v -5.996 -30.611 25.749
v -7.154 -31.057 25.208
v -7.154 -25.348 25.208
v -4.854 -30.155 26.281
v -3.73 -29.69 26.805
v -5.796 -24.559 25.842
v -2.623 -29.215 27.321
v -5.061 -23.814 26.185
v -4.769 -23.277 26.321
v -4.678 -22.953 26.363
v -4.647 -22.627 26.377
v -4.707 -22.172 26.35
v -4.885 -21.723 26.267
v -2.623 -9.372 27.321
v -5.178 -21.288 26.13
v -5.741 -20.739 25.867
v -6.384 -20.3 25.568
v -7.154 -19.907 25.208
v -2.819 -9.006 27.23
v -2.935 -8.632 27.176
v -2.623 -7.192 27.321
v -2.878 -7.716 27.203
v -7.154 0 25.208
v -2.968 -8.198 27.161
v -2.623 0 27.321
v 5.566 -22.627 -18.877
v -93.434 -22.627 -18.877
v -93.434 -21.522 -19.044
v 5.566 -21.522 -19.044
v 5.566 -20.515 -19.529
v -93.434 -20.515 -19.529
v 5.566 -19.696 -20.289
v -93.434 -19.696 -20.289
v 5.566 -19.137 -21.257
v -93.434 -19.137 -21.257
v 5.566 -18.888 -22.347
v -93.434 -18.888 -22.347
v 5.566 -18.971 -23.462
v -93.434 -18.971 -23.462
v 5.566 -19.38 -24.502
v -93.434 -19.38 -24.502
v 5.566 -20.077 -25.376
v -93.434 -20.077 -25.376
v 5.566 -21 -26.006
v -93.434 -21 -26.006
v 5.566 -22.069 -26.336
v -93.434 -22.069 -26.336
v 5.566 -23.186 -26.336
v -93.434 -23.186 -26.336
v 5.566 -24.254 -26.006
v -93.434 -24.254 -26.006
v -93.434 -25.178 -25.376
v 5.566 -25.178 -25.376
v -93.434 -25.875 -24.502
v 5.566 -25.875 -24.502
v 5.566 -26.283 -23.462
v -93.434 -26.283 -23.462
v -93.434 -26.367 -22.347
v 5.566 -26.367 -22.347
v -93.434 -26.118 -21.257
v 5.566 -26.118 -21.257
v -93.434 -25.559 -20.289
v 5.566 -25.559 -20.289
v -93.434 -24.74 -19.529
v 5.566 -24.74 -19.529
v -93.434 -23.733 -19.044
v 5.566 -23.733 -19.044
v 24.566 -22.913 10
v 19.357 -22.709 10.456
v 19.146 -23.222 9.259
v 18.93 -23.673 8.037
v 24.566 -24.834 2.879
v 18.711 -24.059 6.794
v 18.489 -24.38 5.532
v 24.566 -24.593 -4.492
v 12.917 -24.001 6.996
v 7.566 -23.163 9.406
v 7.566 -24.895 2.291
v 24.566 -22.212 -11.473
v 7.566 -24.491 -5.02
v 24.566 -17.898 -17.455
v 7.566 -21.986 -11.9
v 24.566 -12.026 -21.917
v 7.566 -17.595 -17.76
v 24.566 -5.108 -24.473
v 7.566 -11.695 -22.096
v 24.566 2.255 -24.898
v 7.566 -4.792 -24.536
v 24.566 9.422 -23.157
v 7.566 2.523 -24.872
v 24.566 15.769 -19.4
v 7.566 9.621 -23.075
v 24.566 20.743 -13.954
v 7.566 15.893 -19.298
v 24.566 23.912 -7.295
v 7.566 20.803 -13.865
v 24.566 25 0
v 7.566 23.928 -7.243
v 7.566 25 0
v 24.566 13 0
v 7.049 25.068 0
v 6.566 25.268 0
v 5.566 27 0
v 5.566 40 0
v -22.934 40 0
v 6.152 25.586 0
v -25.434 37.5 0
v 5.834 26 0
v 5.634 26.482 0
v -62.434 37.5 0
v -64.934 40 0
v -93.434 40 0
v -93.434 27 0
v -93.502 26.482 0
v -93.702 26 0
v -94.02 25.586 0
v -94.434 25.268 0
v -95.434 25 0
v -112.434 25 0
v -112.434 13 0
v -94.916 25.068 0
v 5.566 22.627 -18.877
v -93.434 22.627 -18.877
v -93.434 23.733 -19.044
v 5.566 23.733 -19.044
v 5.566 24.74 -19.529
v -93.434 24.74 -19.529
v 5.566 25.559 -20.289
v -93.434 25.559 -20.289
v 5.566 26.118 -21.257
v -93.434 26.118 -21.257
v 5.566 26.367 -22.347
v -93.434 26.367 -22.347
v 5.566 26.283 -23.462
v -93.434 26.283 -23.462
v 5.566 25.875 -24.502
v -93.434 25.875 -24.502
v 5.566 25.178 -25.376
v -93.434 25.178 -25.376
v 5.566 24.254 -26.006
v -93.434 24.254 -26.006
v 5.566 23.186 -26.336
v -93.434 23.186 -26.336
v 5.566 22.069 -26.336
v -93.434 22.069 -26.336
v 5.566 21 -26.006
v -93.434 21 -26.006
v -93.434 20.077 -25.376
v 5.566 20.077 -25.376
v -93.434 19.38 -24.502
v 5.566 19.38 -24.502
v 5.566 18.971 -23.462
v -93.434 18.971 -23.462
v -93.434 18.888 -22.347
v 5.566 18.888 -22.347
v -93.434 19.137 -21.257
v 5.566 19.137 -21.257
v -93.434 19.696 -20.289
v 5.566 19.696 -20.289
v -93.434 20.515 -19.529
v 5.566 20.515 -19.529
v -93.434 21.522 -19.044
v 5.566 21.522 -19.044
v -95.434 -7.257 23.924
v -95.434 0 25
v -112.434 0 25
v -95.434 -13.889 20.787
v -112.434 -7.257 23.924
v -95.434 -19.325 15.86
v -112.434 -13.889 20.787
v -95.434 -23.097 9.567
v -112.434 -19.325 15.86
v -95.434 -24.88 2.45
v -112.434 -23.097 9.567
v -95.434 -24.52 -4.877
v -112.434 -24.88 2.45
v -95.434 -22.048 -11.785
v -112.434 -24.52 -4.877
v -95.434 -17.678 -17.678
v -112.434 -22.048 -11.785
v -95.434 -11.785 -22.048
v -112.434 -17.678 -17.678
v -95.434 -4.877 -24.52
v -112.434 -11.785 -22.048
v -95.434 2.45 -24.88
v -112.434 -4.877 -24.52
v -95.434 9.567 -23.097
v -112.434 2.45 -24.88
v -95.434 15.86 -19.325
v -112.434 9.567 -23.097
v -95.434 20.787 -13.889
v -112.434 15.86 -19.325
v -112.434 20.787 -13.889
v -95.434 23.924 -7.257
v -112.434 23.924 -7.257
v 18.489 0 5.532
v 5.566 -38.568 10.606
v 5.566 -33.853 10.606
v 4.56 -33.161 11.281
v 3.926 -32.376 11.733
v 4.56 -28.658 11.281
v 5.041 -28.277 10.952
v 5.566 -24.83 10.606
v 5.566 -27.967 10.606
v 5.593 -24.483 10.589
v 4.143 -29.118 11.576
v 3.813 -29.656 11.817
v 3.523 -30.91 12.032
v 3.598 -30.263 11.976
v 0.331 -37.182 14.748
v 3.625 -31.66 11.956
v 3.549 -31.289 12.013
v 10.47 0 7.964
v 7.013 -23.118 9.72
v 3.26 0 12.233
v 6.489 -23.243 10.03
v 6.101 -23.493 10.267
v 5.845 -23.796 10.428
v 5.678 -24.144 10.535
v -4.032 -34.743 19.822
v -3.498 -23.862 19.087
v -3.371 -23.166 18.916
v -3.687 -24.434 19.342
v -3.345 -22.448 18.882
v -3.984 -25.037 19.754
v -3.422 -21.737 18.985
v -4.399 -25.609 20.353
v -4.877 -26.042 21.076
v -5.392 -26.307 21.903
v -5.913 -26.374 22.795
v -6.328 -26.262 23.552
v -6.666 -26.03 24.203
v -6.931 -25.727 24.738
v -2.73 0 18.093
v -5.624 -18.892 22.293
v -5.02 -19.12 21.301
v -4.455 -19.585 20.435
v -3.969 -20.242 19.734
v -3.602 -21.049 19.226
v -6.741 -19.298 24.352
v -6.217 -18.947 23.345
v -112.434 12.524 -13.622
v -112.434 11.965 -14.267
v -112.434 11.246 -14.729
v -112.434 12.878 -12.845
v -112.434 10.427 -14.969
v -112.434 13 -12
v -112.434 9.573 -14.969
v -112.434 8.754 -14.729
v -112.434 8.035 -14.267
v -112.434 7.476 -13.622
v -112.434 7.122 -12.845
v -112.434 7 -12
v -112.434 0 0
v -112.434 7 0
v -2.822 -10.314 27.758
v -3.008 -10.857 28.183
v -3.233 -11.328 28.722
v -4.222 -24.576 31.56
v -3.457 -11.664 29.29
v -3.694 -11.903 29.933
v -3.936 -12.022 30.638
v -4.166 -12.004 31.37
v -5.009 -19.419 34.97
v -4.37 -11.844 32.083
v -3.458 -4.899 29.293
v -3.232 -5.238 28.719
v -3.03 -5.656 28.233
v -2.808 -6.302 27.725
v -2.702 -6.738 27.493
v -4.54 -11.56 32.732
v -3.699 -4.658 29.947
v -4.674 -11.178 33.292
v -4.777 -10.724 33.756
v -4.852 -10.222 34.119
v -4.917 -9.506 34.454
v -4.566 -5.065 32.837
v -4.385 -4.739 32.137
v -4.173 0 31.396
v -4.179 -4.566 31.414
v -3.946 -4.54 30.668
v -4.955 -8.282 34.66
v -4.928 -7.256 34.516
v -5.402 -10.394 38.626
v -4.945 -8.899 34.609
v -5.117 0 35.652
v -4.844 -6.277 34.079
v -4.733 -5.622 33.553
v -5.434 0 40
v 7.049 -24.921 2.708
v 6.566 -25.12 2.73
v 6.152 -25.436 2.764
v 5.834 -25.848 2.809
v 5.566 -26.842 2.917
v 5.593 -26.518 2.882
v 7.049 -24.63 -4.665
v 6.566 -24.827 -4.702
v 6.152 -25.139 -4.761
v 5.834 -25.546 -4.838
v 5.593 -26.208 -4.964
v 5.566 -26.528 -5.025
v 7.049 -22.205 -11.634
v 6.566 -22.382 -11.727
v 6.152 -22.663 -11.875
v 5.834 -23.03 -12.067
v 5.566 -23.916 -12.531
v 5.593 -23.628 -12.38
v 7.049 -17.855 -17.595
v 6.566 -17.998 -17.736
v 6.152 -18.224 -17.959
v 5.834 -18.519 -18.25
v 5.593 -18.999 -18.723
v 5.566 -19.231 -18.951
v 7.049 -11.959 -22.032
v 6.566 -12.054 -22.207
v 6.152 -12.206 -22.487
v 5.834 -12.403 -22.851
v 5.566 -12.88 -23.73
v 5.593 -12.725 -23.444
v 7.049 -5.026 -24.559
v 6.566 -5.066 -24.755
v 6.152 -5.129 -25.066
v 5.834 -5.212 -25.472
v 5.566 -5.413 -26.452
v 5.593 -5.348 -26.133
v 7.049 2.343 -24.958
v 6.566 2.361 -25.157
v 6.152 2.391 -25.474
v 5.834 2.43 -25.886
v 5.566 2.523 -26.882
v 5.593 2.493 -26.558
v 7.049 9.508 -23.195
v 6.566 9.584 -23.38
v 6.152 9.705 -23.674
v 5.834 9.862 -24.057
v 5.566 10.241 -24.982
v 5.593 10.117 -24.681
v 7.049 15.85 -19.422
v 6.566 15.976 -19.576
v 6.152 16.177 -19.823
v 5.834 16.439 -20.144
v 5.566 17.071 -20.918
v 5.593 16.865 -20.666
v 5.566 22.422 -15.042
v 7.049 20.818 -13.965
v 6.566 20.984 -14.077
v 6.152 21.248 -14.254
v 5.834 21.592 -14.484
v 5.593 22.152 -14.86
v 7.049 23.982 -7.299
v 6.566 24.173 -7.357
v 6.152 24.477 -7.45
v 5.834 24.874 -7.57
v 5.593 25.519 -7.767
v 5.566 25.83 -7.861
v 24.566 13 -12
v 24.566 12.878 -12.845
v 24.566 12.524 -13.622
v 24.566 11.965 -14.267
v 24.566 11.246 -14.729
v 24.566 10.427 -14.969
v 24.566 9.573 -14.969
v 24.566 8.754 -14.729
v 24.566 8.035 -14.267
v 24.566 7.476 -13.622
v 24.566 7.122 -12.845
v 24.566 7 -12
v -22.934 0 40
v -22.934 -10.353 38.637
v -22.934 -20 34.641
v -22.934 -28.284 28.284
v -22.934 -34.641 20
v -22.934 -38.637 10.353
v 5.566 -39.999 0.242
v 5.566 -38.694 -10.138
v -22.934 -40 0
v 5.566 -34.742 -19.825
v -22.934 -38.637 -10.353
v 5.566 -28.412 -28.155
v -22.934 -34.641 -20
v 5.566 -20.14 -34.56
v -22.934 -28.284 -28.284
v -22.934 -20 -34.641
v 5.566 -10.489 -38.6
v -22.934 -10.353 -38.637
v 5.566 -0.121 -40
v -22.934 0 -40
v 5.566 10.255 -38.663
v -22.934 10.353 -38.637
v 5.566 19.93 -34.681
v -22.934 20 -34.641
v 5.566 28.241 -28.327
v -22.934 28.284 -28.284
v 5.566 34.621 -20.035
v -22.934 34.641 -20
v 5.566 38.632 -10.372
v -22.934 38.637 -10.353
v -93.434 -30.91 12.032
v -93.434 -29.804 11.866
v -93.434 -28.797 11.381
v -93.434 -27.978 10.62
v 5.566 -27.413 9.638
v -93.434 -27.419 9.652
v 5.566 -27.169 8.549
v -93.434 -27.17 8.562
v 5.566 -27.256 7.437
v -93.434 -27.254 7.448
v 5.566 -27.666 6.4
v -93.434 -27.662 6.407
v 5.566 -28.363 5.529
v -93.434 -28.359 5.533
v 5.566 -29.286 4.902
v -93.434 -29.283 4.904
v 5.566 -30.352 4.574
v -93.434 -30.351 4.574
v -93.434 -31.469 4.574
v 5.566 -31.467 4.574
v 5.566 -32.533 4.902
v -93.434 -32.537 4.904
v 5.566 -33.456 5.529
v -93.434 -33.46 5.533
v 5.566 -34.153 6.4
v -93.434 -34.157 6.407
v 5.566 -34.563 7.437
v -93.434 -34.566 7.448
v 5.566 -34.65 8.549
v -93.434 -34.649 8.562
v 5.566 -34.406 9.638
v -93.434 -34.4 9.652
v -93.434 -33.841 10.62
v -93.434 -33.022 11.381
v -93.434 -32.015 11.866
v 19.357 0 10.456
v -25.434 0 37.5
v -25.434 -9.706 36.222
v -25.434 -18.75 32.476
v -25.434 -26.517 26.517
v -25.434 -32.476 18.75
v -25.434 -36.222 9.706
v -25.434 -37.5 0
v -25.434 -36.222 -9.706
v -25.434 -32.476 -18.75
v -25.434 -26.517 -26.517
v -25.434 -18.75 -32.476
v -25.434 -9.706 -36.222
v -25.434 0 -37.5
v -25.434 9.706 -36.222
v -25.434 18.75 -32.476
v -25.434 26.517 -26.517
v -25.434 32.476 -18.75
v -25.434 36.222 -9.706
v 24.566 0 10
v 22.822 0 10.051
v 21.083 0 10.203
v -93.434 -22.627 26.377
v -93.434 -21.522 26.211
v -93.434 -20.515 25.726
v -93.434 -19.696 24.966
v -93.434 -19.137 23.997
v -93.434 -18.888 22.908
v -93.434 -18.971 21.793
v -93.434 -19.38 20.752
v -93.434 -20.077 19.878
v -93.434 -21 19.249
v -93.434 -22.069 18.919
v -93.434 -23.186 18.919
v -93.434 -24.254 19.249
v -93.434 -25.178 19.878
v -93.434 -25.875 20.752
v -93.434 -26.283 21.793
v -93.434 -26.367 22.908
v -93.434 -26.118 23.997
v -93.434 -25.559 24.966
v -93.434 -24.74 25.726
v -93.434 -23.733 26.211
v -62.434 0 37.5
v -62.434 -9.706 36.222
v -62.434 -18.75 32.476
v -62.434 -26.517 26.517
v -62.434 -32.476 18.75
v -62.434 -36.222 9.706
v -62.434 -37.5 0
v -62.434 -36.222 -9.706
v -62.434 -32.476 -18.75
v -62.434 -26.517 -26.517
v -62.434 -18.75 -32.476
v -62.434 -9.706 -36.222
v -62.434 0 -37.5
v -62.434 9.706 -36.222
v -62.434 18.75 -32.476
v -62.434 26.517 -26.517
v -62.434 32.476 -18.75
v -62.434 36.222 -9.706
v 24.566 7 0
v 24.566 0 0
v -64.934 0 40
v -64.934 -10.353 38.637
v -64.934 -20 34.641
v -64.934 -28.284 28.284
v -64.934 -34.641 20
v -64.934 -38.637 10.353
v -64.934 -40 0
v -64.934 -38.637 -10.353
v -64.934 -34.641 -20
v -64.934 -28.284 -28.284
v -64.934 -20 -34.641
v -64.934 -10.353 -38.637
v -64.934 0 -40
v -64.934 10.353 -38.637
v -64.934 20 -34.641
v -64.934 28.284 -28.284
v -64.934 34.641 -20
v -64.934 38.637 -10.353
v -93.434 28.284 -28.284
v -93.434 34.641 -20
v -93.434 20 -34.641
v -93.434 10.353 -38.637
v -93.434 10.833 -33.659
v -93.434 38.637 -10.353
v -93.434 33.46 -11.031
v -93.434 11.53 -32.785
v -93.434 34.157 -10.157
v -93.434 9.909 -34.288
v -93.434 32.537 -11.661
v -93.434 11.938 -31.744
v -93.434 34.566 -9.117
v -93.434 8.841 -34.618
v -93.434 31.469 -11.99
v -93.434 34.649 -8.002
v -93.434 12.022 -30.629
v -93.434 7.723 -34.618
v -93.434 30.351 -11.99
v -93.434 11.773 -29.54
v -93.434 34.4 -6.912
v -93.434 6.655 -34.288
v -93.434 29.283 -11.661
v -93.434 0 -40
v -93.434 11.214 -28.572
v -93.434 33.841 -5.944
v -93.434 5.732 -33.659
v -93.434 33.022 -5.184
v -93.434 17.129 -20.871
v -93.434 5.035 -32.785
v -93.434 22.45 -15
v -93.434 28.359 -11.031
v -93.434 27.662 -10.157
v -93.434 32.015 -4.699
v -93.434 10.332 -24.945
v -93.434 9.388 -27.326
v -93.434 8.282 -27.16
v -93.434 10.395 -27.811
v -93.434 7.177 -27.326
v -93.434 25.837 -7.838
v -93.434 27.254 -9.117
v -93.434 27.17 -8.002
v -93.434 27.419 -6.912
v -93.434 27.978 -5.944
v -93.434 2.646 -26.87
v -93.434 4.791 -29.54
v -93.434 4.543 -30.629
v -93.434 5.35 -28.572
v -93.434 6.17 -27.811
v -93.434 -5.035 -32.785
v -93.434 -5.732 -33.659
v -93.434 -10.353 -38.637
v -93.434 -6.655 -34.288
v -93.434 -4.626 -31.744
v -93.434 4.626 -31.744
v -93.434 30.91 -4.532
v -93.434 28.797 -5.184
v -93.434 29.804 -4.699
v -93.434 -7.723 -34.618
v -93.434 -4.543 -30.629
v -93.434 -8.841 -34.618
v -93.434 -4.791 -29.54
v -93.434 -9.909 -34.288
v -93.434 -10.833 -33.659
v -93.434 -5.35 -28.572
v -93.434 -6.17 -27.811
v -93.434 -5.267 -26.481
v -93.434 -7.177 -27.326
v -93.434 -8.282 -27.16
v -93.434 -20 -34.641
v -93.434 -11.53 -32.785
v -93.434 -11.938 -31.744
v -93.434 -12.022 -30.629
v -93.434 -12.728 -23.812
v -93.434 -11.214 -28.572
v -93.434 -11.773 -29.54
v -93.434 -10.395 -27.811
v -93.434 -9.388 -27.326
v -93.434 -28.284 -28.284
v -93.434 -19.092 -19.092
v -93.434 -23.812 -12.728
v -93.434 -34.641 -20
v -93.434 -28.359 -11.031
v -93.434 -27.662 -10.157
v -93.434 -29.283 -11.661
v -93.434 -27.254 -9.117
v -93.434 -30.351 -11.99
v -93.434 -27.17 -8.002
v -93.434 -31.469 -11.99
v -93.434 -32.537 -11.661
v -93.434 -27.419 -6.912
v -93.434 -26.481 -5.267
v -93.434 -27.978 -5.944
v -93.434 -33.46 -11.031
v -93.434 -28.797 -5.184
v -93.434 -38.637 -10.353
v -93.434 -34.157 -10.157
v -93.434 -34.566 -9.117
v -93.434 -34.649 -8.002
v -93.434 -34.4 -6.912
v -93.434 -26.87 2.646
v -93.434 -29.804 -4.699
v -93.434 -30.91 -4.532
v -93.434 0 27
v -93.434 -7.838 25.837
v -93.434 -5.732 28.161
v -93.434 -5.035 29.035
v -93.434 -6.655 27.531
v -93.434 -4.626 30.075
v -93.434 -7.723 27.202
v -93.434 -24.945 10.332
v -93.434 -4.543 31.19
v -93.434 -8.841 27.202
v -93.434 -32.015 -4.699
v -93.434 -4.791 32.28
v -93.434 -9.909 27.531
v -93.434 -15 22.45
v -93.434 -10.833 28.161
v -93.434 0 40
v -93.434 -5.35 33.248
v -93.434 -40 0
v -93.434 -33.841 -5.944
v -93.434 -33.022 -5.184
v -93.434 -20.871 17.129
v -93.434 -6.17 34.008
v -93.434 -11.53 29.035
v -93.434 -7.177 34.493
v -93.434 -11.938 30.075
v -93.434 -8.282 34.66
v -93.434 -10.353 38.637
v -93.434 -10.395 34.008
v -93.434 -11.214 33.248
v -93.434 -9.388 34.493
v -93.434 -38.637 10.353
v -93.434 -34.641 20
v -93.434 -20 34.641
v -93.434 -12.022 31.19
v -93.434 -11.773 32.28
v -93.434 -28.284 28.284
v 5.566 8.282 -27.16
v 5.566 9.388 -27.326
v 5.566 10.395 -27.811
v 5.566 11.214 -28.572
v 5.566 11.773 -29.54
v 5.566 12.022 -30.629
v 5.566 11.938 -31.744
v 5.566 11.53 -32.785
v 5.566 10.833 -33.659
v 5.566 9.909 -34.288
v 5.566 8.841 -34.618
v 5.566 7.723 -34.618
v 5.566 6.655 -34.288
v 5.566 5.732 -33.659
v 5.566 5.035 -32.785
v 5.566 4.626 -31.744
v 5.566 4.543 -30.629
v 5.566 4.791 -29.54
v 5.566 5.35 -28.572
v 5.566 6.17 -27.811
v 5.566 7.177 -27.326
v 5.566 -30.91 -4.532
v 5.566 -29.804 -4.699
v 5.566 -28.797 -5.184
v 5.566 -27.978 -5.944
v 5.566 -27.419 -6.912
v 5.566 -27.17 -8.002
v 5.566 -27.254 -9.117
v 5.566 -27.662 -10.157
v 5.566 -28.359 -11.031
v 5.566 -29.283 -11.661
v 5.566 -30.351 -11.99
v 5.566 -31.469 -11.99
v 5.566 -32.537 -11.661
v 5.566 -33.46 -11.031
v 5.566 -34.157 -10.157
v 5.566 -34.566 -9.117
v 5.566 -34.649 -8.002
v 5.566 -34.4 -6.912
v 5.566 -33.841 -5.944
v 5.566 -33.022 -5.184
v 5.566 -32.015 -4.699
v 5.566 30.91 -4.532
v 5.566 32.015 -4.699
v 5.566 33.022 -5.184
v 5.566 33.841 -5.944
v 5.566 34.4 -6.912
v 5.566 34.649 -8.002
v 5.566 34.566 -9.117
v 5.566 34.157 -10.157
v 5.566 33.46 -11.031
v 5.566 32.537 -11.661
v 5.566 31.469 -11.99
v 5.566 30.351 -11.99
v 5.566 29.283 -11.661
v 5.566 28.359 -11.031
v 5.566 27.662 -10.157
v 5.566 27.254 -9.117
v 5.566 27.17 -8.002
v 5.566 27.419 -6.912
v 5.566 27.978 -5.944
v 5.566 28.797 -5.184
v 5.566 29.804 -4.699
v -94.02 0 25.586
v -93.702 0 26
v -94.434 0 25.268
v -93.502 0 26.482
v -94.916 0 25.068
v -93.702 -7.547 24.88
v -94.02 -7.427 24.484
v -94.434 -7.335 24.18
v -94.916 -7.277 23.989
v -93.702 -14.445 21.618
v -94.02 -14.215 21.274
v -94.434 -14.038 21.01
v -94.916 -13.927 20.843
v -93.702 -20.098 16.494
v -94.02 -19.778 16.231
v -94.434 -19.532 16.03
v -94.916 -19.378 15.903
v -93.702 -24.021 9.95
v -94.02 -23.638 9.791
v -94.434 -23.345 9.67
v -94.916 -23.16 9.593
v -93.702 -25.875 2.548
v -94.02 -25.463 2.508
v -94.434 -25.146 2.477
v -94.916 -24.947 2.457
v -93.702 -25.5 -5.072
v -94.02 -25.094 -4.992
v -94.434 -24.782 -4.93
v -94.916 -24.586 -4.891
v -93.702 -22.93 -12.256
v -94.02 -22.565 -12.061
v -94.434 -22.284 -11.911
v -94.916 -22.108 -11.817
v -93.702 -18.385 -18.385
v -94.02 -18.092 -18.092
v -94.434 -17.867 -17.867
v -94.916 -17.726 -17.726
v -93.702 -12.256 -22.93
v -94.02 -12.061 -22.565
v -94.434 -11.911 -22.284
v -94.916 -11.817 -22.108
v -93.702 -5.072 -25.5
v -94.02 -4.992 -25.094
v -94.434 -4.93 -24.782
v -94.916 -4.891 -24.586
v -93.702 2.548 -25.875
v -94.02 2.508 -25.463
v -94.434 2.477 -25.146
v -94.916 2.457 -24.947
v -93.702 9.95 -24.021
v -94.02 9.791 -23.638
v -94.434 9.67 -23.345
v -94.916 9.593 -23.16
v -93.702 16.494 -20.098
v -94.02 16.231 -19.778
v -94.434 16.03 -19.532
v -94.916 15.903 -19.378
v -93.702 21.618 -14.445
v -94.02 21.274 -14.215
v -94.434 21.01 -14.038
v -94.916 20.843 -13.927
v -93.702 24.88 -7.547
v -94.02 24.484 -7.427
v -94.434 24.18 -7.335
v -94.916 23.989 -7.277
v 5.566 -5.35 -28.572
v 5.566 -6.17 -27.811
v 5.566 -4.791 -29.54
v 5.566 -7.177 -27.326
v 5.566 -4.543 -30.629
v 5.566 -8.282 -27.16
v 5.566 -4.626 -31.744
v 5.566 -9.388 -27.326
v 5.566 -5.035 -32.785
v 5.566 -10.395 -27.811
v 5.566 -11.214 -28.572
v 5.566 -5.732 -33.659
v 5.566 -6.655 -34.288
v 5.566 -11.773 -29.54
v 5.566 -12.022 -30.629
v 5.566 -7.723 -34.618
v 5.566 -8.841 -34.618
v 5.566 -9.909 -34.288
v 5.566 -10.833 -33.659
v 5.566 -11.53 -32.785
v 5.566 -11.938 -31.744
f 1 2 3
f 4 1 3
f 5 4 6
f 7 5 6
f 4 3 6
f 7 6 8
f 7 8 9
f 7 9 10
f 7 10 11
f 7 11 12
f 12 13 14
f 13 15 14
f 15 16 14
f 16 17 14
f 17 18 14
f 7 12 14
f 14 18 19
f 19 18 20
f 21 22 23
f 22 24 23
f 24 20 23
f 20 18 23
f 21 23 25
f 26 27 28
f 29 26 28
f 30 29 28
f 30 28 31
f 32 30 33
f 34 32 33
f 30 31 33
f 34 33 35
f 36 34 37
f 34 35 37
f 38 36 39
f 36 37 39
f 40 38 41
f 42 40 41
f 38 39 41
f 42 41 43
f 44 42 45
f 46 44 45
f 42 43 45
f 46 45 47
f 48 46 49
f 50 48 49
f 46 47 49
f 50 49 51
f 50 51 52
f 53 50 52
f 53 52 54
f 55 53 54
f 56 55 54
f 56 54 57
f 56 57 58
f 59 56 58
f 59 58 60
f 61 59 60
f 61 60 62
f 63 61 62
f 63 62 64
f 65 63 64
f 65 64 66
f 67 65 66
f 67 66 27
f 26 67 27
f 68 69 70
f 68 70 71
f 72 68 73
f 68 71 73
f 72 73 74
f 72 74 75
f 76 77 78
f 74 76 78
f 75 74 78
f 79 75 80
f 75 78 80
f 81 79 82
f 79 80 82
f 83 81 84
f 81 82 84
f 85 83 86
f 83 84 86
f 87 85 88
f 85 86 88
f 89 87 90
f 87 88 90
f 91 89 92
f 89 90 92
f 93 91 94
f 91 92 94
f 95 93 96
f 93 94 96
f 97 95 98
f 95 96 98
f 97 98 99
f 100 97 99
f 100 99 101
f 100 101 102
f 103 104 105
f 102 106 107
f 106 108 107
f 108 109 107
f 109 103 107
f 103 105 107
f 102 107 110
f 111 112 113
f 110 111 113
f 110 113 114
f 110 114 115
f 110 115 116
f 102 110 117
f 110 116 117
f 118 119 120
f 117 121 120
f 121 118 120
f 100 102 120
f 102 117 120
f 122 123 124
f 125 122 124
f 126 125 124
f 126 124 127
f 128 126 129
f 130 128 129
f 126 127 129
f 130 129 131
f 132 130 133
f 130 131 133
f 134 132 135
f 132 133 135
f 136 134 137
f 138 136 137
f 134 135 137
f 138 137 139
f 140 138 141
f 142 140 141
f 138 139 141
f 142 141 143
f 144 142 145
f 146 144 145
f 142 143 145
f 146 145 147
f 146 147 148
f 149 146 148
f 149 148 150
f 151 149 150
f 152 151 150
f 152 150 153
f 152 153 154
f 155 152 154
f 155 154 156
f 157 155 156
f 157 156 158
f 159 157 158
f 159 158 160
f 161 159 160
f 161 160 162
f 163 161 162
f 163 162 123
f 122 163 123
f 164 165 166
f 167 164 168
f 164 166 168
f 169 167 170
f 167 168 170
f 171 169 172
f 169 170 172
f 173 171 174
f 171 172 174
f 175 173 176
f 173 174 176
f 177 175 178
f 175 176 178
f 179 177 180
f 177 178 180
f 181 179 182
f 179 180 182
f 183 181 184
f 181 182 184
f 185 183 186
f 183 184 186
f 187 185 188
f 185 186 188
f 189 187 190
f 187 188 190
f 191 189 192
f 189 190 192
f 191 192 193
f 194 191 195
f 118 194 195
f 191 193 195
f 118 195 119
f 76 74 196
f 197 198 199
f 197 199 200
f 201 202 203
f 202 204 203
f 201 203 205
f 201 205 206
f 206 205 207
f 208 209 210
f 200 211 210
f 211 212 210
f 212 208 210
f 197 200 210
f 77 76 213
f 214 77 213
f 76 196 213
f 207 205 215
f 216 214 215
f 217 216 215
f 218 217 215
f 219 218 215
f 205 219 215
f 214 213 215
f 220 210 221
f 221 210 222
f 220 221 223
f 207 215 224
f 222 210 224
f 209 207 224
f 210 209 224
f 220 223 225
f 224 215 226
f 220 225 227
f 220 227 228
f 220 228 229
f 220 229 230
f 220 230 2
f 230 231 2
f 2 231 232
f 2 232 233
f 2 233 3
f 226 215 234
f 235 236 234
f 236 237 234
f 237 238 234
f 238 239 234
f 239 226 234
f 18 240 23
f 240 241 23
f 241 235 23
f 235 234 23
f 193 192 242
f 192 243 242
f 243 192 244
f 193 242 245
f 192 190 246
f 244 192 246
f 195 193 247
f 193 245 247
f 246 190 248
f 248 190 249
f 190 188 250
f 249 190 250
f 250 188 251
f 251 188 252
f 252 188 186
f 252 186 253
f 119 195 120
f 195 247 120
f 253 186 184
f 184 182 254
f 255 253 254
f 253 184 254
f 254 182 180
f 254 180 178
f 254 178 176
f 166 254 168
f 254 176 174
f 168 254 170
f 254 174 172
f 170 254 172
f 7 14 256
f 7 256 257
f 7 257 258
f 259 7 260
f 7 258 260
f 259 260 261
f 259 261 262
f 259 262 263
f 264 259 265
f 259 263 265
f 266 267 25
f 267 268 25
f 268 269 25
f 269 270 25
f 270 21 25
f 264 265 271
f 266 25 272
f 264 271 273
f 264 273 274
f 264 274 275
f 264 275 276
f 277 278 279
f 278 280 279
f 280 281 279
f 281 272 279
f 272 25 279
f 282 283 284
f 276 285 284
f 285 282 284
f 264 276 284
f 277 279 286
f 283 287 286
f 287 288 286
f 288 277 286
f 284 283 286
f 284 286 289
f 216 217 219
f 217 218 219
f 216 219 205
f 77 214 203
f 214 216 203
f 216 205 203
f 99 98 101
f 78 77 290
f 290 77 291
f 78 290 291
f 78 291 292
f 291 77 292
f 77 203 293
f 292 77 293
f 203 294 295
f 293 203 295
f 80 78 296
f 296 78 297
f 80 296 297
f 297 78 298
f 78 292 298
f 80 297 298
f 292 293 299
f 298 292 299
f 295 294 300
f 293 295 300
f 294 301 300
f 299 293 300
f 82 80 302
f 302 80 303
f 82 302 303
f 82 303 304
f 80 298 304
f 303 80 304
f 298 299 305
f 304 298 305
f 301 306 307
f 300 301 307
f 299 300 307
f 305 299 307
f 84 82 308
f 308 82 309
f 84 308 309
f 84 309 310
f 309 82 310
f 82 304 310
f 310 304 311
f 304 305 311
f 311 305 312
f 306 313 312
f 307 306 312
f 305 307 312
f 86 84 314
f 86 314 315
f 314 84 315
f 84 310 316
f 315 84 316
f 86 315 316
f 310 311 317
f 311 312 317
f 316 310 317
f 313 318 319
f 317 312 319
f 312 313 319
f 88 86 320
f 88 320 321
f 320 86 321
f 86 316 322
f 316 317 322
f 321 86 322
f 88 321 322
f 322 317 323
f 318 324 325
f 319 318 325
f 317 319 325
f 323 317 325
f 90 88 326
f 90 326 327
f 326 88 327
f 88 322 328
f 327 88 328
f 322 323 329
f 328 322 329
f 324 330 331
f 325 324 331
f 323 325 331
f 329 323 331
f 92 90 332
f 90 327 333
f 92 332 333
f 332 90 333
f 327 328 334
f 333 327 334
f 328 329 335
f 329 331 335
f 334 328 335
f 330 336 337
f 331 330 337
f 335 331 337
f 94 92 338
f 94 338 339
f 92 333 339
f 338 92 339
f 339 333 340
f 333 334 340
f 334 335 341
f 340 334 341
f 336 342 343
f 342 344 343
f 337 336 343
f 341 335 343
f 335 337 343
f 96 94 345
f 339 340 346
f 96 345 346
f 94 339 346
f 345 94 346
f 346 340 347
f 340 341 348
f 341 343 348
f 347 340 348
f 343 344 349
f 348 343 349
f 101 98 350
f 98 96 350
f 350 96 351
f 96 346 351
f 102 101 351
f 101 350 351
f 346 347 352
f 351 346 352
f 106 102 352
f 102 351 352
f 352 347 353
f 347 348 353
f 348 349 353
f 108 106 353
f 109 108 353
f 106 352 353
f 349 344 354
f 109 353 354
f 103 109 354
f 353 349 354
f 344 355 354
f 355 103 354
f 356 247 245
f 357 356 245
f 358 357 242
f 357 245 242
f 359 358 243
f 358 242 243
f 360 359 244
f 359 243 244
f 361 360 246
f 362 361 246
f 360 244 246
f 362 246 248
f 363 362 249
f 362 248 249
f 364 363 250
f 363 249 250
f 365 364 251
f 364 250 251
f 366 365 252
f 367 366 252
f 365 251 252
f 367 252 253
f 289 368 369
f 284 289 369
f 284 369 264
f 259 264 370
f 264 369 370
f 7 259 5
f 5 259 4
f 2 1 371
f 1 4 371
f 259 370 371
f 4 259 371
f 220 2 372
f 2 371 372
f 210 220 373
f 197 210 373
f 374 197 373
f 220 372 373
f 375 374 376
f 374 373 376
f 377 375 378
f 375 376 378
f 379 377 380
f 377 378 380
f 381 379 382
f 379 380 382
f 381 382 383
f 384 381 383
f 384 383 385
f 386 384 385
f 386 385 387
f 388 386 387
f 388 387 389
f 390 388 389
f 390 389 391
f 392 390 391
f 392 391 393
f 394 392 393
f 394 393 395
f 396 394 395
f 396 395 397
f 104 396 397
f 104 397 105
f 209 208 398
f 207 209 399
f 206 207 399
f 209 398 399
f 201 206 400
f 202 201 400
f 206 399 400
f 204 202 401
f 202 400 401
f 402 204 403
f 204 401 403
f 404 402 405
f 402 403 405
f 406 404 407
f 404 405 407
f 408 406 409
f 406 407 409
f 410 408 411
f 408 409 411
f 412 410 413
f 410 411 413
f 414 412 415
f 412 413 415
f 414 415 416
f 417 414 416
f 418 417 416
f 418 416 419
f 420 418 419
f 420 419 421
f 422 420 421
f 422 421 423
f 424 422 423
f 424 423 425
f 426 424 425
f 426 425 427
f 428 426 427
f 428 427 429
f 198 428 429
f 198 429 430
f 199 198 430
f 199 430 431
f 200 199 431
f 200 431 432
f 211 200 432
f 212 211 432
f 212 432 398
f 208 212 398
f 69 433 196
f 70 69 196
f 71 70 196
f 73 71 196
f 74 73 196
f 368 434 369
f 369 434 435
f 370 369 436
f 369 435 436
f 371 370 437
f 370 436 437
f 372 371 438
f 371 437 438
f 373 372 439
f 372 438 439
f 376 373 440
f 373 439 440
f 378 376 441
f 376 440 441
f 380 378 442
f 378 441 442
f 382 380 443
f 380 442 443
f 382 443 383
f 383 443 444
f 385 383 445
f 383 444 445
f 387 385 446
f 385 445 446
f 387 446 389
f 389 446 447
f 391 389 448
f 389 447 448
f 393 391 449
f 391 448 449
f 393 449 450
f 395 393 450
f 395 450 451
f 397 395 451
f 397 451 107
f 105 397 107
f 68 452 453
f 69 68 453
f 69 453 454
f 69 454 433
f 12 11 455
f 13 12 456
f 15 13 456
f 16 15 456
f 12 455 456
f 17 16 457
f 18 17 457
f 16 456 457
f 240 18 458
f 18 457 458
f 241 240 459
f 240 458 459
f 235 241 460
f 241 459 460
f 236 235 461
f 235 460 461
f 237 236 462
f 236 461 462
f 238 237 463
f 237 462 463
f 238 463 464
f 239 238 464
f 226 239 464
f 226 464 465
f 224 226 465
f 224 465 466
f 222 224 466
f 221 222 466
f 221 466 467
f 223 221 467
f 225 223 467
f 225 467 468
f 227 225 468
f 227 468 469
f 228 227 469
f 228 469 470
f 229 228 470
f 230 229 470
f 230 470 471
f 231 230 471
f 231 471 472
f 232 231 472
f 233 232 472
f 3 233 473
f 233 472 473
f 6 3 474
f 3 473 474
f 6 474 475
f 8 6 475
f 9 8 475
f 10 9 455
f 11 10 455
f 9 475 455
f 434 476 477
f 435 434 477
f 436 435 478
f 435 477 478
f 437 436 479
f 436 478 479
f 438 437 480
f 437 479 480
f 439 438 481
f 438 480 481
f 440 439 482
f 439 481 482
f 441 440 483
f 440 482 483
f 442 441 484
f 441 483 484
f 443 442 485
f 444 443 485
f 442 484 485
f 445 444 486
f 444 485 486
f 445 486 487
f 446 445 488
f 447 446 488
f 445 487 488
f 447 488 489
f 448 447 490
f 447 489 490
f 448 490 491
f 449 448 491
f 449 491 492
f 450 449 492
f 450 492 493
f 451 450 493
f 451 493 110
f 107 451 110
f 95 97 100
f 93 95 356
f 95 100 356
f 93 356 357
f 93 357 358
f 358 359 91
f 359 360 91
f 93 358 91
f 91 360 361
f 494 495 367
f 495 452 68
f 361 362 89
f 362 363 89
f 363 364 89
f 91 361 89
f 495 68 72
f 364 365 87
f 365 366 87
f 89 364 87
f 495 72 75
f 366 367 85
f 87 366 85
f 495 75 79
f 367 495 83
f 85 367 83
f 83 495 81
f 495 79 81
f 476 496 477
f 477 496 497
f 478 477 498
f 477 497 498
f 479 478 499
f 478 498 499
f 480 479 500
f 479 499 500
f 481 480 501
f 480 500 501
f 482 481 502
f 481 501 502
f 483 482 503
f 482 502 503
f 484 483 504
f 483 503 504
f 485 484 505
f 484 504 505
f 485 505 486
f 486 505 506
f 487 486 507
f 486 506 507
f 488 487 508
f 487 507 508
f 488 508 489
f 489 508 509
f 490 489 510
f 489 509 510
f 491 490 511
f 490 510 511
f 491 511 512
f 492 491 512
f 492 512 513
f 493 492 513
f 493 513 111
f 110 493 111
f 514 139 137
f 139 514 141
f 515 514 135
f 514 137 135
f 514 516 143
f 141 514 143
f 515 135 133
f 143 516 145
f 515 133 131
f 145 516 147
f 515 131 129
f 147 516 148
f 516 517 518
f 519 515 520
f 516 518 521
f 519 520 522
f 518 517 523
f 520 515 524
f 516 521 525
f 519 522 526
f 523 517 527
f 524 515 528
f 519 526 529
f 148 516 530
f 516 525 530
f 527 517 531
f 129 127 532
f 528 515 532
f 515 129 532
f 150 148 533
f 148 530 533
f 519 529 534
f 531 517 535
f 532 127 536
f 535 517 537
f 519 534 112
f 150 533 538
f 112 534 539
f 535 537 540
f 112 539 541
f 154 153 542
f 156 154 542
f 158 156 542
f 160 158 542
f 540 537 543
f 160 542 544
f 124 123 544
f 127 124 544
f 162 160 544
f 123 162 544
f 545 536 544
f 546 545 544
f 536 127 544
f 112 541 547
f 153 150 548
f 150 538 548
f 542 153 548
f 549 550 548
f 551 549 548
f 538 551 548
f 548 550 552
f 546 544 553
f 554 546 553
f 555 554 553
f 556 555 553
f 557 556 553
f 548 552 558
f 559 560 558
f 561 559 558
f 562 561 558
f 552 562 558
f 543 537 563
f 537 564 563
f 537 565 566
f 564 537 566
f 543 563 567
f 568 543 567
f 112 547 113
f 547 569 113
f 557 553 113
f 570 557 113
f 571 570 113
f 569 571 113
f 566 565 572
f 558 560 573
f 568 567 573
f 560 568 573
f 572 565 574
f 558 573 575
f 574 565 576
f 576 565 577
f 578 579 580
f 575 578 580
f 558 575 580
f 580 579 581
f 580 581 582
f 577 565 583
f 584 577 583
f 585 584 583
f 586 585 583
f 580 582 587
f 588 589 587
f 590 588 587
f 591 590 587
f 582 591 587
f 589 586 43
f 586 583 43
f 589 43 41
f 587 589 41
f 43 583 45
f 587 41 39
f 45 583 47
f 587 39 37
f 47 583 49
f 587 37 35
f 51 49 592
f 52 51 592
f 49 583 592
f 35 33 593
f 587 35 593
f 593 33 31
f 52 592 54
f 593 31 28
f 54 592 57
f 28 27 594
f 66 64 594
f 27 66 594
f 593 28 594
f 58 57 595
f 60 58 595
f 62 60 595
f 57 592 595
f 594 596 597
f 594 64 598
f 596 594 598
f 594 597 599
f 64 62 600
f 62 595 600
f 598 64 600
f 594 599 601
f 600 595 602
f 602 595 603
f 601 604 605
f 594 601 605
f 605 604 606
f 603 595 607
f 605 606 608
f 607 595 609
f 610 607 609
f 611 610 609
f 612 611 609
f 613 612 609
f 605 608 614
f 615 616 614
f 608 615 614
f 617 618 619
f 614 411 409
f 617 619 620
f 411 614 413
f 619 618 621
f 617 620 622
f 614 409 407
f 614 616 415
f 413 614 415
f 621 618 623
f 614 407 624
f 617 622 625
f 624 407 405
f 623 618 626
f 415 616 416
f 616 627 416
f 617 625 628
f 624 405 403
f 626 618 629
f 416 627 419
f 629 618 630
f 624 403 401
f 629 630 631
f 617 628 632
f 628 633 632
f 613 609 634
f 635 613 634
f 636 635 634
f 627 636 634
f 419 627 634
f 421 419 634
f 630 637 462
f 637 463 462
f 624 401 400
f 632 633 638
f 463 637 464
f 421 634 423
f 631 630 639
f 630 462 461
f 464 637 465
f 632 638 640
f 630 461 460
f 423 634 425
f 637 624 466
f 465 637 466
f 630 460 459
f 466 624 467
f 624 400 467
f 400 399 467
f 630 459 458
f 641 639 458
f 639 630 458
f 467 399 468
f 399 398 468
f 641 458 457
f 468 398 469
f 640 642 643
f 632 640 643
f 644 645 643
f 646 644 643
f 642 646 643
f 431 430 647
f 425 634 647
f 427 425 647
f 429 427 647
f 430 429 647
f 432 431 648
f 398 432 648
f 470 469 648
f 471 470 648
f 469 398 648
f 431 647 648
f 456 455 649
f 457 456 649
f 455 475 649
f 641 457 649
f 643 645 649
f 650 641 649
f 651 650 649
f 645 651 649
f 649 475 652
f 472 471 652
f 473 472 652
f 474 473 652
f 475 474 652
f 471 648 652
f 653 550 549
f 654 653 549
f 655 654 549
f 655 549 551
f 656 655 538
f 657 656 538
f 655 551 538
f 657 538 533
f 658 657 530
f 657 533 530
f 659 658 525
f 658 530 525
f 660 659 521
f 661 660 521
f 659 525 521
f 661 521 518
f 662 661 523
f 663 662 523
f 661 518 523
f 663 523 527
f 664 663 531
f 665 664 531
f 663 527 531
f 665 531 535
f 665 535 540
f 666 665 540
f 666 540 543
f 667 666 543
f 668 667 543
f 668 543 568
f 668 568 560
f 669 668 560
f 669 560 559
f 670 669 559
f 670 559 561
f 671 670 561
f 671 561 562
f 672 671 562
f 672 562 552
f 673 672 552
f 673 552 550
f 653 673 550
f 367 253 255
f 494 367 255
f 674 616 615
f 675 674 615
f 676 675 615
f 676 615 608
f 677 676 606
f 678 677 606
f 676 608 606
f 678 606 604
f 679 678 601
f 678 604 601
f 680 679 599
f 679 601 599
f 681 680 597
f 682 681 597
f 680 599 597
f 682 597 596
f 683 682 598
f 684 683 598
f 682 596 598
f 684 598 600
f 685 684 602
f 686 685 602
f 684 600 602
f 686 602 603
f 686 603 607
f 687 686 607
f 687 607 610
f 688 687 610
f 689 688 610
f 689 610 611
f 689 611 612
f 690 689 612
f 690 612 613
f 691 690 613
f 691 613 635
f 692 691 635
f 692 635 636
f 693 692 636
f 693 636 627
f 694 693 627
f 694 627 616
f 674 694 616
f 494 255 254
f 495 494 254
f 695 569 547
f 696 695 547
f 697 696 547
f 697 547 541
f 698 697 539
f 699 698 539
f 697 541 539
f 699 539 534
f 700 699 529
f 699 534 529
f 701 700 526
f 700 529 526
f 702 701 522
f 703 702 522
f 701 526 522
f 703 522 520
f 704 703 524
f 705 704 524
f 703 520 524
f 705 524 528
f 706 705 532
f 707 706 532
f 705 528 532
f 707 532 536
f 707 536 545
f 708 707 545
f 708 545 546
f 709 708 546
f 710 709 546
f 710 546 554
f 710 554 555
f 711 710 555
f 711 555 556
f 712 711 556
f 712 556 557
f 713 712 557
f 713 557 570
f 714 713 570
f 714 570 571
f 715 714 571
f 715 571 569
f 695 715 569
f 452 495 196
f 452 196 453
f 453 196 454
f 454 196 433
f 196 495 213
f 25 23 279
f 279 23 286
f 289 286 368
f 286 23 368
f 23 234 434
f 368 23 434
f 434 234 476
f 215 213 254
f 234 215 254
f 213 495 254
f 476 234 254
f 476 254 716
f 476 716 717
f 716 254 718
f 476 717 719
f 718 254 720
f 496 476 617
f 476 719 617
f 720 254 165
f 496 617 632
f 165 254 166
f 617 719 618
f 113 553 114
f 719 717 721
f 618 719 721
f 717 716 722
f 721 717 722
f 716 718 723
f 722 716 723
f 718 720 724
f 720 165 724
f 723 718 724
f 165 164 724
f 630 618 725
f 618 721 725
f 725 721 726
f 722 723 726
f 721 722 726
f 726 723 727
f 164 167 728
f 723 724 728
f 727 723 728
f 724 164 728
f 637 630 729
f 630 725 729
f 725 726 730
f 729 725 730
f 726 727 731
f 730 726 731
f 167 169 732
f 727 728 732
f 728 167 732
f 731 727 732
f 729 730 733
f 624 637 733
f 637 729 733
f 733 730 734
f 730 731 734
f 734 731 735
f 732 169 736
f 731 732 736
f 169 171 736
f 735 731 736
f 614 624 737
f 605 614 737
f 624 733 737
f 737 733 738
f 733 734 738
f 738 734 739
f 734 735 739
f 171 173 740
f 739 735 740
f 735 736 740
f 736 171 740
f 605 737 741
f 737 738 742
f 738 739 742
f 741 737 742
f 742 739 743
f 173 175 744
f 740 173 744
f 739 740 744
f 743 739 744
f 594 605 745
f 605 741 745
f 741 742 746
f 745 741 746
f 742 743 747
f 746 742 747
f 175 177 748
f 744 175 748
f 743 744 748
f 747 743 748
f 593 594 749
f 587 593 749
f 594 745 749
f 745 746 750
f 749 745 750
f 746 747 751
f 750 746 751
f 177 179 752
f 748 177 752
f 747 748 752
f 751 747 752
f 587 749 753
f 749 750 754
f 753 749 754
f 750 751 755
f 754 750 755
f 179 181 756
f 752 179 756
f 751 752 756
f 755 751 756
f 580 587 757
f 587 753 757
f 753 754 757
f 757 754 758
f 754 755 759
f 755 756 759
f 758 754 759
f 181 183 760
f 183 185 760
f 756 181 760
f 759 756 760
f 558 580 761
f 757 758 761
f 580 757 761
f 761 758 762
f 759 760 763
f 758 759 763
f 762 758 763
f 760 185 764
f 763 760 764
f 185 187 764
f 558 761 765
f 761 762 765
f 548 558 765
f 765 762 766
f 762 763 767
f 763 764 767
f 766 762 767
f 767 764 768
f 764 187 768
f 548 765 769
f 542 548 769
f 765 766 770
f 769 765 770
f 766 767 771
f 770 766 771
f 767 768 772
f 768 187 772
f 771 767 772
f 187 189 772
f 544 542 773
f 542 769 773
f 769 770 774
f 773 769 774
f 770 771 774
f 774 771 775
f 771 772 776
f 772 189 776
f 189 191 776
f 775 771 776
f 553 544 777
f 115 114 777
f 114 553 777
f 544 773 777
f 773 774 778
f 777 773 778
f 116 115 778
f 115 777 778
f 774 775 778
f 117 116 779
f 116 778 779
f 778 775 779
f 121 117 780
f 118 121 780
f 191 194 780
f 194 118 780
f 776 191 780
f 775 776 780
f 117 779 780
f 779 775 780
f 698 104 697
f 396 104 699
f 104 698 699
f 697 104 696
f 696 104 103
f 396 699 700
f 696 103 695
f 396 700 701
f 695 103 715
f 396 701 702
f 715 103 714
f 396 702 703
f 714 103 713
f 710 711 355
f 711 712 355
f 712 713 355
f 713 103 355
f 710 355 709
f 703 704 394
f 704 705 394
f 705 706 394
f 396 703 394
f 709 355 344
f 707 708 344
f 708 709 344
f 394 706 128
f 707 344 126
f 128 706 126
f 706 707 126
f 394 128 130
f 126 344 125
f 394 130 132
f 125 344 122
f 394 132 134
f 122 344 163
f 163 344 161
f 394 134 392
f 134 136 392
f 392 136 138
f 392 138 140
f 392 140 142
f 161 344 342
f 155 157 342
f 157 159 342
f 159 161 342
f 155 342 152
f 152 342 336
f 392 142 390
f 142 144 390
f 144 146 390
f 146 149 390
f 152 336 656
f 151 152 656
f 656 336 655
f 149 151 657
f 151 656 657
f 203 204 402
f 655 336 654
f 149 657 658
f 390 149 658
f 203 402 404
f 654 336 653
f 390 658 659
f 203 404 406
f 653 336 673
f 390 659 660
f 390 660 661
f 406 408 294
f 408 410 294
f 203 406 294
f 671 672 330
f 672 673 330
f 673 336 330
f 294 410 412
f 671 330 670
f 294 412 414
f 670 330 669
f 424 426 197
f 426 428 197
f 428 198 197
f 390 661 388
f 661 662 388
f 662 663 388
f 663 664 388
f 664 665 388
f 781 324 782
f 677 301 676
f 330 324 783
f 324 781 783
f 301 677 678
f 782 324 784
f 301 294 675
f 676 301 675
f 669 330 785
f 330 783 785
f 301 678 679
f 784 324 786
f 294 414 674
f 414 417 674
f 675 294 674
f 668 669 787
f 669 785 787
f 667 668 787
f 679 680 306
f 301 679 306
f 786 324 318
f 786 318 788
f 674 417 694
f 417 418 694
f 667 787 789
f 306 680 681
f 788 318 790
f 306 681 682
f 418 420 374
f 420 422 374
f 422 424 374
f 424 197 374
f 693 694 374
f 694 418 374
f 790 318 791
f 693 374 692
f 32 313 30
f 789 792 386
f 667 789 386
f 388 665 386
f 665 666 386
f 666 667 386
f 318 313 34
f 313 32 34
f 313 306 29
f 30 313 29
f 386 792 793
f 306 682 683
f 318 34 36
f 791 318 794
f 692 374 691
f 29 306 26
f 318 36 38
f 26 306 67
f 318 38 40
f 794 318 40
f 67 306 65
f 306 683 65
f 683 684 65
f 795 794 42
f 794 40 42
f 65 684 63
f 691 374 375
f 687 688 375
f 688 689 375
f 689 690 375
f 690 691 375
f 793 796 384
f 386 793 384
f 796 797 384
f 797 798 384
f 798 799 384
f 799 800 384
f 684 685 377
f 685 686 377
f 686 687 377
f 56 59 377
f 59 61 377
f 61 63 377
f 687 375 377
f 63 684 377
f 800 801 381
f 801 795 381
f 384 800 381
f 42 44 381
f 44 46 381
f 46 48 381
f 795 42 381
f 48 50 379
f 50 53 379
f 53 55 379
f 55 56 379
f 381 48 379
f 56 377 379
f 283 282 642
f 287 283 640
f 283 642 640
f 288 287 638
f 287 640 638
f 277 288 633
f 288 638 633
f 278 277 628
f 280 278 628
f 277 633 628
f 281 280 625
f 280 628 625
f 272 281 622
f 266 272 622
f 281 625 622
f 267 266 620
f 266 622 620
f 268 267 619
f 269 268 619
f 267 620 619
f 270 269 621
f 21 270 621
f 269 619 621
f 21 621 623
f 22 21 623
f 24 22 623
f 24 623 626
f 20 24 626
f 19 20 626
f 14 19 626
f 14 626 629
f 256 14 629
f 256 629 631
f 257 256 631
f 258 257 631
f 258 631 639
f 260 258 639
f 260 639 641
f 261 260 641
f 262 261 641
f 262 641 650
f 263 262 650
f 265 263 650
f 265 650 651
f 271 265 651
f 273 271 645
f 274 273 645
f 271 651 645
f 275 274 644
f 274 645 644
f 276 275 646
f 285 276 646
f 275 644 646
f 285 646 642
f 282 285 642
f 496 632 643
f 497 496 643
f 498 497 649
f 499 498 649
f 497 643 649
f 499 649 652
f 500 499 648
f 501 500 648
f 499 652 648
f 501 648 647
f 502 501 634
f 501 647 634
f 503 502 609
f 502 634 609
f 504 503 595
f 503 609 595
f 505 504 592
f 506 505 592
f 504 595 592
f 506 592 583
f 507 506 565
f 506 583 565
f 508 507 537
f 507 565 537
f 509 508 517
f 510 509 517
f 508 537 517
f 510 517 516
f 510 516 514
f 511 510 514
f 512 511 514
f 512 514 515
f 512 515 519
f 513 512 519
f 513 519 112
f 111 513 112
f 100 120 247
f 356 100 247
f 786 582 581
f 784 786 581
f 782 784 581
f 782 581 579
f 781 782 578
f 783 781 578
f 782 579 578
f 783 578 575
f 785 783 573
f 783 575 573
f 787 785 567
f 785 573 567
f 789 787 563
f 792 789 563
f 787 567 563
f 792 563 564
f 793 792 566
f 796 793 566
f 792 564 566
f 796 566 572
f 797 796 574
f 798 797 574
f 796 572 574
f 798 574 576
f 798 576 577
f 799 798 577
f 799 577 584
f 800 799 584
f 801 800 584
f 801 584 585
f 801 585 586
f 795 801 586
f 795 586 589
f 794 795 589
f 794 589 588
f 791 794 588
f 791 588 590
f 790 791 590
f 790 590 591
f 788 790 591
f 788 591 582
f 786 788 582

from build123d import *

# Parameters (mm, degrees)
ENL_V_MAT_EXTRU_1_DEPTH = 149.219431924
ESQUISSE3_R             = 3.75
ENL_V_MAT_EXTRU_2_DEPTH = 131.858702424
ENL_V_MAT_EXTRU_3_DEPTH = 126.862394907


with BuildPart() as part:
    # Esquisse1 → Révolution1 (revolve)
    with BuildSketch(Plane.XY, mode=Mode.PRIVATE) as r_volution1_sk:
        with BuildLine():
            Line((0, 0), (24.566275292, 0))
            Line((24.566275292, 0), (24.566275292, 25))
            Line((24.566275292, 25), (7.566275292, 25))
            ThreePointArc((7.566275292, 25), (6.152061729, 25.585786438), (5.566275292, 27))
            Line((5.566275292, 27), (5.566275292, 40))
            Line((5.566275292, 40), (-22.933724708, 40))
            Line((-22.933724708, 40), (-25.433724708, 37.5))
            Line((-25.433724708, 37.5), (-62.433724708, 37.5))
            Line((-62.433724708, 37.5), (-64.933724708, 40))
            Line((-64.933724708, 40), (-93.433724708, 40))
            Line((-93.433724708, 40), (-93.433724708, 27))
            ThreePointArc((-93.433724708, 27), (-94.019511146, 25.585786438), (-95.433724708, 25))
            Line((-95.433724708, 25), (-112.433724708, 25))
            Line((-112.433724708, 25), (-112.433724708, 0))
            Line((-112.433724708, 0), (0, 0))
        make_face()
    revolve(r_volution1_sk.sketch.rotate(Axis((-130.768922499, 0, 0), (1, 0, 0)), 90), axis=Axis((-130.768922499, 0, 0), (1, 0, 0)))

    # Esquisse2 → Enlèv. mat.-Extru.1 (cut, through all)
    with BuildSketch(Plane.ZY.offset(112.433724708)):
        with BuildLine():
            Line((0, 7), (0, 0))
            Line((0, 0), (43.449782835, 0))
            Line((43.449782835, 0), (43.449782835, 44.497429883))
            Line((43.449782835, 44.497429883), (0, 44.497429883))
            Line((0, 44.497429883), (0, 13))
            ThreePointArc((0, 13), (3, 10), (0, 7))
        make_face()
        with BuildLine():
            Line((-12, 7), (0, 7))
            ThreePointArc((0, 7), (3, 10), (0, 13))
            Line((0, 13), (-12, 13))
            ThreePointArc((-12, 13), (-15, 10), (-12, 7))
        make_face()
    extrude(amount=-ENL_V_MAT_EXTRU_1_DEPTH, mode=Mode.SUBTRACT)

    # Esquisse3 → Enlèv. mat.-Extru.2 (cut, through all)
    with BuildSketch(Plane.ZY.offset(93.433724708)):
        with Locations((-8.282209443, 30.909626441)):
            Circle(ESQUISSE3_R)
        with Locations((-22.627416998, 22.627416998)):
            Circle(ESQUISSE3_R)
        with Locations((-30.909626441, 8.282209443)):
            Circle(ESQUISSE3_R)
        with Locations((-30.909626441, -8.282209443)):
            Circle(ESQUISSE3_R)
        with Locations((-22.627416998, -22.627416998)):
            Circle(ESQUISSE3_R)
        with Locations((-8.282209443, -30.909626441)):
            Circle(ESQUISSE3_R)
        with Locations((8.282209443, -30.909626441)):
            Circle(ESQUISSE3_R)
        with Locations((22.627416998, -22.627416998)):
            Circle(ESQUISSE3_R)
        with Locations((30.909626441, -8.282209443)):
            Circle(ESQUISSE3_R)
    extrude(amount=-ENL_V_MAT_EXTRU_2_DEPTH, mode=Mode.SUBTRACT)

    # Esquisse4 → Enlèv. mat.-Extru.3 (cut, through all)
    with BuildSketch(Plane(origin=(0, 0, 0), x_dir=(1, 0, 0), z_dir=(0, 1, 0))):
        with BuildLine():
            Line((5.566275292, -31.140154495), (24.566275292, -40))
            Line((24.566275292, -40), (21.921370581, -25))
            Line((21.921370581, -25), (7.566275292, -25))
            ThreePointArc((7.566275292, -25), (6.152061729, -25.585786438), (5.566275292, -27))
            Line((5.566275292, -27), (5.566275292, -31.140154495))
        make_face()
        with BuildLine():
            Line((-5.433724708, -40), (5.566275292, -40))
            Line((5.566275292, -40), (5.566275292, -31.140154495))
            Line((5.566275292, -31.140154495), (-2.622958319, -27.321452148))
            ThreePointArc((-2.622958319, -27.321452148), (-4.722604922, -33.506811582), (-5.433724708, -40))
        make_face()
        with BuildLine():
            Line((-2.622958319, -27.321452148), (5.566275292, -31.140154495))
            Line((5.566275292, -31.140154495), (5.566275292, -27))
            ThreePointArc((5.566275292, -27), (6.152061729, -25.585786438), (7.566275292, -25))
            Line((7.566275292, -25), (21.921370581, -25))
            Line((21.921370581, -25), (19.356829962, -10.45576741))
            ThreePointArc((19.356829962, -10.45576741), (6.303432421, -16.199399791), (-2.622958319, -27.321452148))
        make_face()
        Polygon((5.566275292, -40), (24.566275292, -40), (5.566275292, -31.140154495), align=None)
        with BuildLine():
            Line((-7.154497255, -25.208360839), (-2.622958319, -27.321452148))
            ThreePointArc((-2.622958319, -27.321452148), (6.303432421, -16.199399791), (19.356829962, -10.45576741))
            Line((19.356829962, -10.45576741), (18.488589073, -5.531728645))
            ThreePointArc((18.488589073, -5.531728645), (3.259625276, -12.23263309), (-7.154497255, -25.208360839))
        make_face()
        with BuildLine():
            Line((21.921370581, -25), (24.566275292, -25))
            Line((24.566275292, -25), (24.566275292, -10))
            ThreePointArc((24.566275292, -10), (21.951603009, -10.114159057), (19.356829962, -10.45576741))
            Line((19.356829962, -10.45576741), (21.921370581, -25))
        make_face()
        Polygon((21.921370581, -25), (24.566275292, -40), (24.566275292, -25), align=None)
    extrude(amount=-ENL_V_MAT_EXTRU_3_DEPTH, mode=Mode.SUBTRACT)


solid = part.part
